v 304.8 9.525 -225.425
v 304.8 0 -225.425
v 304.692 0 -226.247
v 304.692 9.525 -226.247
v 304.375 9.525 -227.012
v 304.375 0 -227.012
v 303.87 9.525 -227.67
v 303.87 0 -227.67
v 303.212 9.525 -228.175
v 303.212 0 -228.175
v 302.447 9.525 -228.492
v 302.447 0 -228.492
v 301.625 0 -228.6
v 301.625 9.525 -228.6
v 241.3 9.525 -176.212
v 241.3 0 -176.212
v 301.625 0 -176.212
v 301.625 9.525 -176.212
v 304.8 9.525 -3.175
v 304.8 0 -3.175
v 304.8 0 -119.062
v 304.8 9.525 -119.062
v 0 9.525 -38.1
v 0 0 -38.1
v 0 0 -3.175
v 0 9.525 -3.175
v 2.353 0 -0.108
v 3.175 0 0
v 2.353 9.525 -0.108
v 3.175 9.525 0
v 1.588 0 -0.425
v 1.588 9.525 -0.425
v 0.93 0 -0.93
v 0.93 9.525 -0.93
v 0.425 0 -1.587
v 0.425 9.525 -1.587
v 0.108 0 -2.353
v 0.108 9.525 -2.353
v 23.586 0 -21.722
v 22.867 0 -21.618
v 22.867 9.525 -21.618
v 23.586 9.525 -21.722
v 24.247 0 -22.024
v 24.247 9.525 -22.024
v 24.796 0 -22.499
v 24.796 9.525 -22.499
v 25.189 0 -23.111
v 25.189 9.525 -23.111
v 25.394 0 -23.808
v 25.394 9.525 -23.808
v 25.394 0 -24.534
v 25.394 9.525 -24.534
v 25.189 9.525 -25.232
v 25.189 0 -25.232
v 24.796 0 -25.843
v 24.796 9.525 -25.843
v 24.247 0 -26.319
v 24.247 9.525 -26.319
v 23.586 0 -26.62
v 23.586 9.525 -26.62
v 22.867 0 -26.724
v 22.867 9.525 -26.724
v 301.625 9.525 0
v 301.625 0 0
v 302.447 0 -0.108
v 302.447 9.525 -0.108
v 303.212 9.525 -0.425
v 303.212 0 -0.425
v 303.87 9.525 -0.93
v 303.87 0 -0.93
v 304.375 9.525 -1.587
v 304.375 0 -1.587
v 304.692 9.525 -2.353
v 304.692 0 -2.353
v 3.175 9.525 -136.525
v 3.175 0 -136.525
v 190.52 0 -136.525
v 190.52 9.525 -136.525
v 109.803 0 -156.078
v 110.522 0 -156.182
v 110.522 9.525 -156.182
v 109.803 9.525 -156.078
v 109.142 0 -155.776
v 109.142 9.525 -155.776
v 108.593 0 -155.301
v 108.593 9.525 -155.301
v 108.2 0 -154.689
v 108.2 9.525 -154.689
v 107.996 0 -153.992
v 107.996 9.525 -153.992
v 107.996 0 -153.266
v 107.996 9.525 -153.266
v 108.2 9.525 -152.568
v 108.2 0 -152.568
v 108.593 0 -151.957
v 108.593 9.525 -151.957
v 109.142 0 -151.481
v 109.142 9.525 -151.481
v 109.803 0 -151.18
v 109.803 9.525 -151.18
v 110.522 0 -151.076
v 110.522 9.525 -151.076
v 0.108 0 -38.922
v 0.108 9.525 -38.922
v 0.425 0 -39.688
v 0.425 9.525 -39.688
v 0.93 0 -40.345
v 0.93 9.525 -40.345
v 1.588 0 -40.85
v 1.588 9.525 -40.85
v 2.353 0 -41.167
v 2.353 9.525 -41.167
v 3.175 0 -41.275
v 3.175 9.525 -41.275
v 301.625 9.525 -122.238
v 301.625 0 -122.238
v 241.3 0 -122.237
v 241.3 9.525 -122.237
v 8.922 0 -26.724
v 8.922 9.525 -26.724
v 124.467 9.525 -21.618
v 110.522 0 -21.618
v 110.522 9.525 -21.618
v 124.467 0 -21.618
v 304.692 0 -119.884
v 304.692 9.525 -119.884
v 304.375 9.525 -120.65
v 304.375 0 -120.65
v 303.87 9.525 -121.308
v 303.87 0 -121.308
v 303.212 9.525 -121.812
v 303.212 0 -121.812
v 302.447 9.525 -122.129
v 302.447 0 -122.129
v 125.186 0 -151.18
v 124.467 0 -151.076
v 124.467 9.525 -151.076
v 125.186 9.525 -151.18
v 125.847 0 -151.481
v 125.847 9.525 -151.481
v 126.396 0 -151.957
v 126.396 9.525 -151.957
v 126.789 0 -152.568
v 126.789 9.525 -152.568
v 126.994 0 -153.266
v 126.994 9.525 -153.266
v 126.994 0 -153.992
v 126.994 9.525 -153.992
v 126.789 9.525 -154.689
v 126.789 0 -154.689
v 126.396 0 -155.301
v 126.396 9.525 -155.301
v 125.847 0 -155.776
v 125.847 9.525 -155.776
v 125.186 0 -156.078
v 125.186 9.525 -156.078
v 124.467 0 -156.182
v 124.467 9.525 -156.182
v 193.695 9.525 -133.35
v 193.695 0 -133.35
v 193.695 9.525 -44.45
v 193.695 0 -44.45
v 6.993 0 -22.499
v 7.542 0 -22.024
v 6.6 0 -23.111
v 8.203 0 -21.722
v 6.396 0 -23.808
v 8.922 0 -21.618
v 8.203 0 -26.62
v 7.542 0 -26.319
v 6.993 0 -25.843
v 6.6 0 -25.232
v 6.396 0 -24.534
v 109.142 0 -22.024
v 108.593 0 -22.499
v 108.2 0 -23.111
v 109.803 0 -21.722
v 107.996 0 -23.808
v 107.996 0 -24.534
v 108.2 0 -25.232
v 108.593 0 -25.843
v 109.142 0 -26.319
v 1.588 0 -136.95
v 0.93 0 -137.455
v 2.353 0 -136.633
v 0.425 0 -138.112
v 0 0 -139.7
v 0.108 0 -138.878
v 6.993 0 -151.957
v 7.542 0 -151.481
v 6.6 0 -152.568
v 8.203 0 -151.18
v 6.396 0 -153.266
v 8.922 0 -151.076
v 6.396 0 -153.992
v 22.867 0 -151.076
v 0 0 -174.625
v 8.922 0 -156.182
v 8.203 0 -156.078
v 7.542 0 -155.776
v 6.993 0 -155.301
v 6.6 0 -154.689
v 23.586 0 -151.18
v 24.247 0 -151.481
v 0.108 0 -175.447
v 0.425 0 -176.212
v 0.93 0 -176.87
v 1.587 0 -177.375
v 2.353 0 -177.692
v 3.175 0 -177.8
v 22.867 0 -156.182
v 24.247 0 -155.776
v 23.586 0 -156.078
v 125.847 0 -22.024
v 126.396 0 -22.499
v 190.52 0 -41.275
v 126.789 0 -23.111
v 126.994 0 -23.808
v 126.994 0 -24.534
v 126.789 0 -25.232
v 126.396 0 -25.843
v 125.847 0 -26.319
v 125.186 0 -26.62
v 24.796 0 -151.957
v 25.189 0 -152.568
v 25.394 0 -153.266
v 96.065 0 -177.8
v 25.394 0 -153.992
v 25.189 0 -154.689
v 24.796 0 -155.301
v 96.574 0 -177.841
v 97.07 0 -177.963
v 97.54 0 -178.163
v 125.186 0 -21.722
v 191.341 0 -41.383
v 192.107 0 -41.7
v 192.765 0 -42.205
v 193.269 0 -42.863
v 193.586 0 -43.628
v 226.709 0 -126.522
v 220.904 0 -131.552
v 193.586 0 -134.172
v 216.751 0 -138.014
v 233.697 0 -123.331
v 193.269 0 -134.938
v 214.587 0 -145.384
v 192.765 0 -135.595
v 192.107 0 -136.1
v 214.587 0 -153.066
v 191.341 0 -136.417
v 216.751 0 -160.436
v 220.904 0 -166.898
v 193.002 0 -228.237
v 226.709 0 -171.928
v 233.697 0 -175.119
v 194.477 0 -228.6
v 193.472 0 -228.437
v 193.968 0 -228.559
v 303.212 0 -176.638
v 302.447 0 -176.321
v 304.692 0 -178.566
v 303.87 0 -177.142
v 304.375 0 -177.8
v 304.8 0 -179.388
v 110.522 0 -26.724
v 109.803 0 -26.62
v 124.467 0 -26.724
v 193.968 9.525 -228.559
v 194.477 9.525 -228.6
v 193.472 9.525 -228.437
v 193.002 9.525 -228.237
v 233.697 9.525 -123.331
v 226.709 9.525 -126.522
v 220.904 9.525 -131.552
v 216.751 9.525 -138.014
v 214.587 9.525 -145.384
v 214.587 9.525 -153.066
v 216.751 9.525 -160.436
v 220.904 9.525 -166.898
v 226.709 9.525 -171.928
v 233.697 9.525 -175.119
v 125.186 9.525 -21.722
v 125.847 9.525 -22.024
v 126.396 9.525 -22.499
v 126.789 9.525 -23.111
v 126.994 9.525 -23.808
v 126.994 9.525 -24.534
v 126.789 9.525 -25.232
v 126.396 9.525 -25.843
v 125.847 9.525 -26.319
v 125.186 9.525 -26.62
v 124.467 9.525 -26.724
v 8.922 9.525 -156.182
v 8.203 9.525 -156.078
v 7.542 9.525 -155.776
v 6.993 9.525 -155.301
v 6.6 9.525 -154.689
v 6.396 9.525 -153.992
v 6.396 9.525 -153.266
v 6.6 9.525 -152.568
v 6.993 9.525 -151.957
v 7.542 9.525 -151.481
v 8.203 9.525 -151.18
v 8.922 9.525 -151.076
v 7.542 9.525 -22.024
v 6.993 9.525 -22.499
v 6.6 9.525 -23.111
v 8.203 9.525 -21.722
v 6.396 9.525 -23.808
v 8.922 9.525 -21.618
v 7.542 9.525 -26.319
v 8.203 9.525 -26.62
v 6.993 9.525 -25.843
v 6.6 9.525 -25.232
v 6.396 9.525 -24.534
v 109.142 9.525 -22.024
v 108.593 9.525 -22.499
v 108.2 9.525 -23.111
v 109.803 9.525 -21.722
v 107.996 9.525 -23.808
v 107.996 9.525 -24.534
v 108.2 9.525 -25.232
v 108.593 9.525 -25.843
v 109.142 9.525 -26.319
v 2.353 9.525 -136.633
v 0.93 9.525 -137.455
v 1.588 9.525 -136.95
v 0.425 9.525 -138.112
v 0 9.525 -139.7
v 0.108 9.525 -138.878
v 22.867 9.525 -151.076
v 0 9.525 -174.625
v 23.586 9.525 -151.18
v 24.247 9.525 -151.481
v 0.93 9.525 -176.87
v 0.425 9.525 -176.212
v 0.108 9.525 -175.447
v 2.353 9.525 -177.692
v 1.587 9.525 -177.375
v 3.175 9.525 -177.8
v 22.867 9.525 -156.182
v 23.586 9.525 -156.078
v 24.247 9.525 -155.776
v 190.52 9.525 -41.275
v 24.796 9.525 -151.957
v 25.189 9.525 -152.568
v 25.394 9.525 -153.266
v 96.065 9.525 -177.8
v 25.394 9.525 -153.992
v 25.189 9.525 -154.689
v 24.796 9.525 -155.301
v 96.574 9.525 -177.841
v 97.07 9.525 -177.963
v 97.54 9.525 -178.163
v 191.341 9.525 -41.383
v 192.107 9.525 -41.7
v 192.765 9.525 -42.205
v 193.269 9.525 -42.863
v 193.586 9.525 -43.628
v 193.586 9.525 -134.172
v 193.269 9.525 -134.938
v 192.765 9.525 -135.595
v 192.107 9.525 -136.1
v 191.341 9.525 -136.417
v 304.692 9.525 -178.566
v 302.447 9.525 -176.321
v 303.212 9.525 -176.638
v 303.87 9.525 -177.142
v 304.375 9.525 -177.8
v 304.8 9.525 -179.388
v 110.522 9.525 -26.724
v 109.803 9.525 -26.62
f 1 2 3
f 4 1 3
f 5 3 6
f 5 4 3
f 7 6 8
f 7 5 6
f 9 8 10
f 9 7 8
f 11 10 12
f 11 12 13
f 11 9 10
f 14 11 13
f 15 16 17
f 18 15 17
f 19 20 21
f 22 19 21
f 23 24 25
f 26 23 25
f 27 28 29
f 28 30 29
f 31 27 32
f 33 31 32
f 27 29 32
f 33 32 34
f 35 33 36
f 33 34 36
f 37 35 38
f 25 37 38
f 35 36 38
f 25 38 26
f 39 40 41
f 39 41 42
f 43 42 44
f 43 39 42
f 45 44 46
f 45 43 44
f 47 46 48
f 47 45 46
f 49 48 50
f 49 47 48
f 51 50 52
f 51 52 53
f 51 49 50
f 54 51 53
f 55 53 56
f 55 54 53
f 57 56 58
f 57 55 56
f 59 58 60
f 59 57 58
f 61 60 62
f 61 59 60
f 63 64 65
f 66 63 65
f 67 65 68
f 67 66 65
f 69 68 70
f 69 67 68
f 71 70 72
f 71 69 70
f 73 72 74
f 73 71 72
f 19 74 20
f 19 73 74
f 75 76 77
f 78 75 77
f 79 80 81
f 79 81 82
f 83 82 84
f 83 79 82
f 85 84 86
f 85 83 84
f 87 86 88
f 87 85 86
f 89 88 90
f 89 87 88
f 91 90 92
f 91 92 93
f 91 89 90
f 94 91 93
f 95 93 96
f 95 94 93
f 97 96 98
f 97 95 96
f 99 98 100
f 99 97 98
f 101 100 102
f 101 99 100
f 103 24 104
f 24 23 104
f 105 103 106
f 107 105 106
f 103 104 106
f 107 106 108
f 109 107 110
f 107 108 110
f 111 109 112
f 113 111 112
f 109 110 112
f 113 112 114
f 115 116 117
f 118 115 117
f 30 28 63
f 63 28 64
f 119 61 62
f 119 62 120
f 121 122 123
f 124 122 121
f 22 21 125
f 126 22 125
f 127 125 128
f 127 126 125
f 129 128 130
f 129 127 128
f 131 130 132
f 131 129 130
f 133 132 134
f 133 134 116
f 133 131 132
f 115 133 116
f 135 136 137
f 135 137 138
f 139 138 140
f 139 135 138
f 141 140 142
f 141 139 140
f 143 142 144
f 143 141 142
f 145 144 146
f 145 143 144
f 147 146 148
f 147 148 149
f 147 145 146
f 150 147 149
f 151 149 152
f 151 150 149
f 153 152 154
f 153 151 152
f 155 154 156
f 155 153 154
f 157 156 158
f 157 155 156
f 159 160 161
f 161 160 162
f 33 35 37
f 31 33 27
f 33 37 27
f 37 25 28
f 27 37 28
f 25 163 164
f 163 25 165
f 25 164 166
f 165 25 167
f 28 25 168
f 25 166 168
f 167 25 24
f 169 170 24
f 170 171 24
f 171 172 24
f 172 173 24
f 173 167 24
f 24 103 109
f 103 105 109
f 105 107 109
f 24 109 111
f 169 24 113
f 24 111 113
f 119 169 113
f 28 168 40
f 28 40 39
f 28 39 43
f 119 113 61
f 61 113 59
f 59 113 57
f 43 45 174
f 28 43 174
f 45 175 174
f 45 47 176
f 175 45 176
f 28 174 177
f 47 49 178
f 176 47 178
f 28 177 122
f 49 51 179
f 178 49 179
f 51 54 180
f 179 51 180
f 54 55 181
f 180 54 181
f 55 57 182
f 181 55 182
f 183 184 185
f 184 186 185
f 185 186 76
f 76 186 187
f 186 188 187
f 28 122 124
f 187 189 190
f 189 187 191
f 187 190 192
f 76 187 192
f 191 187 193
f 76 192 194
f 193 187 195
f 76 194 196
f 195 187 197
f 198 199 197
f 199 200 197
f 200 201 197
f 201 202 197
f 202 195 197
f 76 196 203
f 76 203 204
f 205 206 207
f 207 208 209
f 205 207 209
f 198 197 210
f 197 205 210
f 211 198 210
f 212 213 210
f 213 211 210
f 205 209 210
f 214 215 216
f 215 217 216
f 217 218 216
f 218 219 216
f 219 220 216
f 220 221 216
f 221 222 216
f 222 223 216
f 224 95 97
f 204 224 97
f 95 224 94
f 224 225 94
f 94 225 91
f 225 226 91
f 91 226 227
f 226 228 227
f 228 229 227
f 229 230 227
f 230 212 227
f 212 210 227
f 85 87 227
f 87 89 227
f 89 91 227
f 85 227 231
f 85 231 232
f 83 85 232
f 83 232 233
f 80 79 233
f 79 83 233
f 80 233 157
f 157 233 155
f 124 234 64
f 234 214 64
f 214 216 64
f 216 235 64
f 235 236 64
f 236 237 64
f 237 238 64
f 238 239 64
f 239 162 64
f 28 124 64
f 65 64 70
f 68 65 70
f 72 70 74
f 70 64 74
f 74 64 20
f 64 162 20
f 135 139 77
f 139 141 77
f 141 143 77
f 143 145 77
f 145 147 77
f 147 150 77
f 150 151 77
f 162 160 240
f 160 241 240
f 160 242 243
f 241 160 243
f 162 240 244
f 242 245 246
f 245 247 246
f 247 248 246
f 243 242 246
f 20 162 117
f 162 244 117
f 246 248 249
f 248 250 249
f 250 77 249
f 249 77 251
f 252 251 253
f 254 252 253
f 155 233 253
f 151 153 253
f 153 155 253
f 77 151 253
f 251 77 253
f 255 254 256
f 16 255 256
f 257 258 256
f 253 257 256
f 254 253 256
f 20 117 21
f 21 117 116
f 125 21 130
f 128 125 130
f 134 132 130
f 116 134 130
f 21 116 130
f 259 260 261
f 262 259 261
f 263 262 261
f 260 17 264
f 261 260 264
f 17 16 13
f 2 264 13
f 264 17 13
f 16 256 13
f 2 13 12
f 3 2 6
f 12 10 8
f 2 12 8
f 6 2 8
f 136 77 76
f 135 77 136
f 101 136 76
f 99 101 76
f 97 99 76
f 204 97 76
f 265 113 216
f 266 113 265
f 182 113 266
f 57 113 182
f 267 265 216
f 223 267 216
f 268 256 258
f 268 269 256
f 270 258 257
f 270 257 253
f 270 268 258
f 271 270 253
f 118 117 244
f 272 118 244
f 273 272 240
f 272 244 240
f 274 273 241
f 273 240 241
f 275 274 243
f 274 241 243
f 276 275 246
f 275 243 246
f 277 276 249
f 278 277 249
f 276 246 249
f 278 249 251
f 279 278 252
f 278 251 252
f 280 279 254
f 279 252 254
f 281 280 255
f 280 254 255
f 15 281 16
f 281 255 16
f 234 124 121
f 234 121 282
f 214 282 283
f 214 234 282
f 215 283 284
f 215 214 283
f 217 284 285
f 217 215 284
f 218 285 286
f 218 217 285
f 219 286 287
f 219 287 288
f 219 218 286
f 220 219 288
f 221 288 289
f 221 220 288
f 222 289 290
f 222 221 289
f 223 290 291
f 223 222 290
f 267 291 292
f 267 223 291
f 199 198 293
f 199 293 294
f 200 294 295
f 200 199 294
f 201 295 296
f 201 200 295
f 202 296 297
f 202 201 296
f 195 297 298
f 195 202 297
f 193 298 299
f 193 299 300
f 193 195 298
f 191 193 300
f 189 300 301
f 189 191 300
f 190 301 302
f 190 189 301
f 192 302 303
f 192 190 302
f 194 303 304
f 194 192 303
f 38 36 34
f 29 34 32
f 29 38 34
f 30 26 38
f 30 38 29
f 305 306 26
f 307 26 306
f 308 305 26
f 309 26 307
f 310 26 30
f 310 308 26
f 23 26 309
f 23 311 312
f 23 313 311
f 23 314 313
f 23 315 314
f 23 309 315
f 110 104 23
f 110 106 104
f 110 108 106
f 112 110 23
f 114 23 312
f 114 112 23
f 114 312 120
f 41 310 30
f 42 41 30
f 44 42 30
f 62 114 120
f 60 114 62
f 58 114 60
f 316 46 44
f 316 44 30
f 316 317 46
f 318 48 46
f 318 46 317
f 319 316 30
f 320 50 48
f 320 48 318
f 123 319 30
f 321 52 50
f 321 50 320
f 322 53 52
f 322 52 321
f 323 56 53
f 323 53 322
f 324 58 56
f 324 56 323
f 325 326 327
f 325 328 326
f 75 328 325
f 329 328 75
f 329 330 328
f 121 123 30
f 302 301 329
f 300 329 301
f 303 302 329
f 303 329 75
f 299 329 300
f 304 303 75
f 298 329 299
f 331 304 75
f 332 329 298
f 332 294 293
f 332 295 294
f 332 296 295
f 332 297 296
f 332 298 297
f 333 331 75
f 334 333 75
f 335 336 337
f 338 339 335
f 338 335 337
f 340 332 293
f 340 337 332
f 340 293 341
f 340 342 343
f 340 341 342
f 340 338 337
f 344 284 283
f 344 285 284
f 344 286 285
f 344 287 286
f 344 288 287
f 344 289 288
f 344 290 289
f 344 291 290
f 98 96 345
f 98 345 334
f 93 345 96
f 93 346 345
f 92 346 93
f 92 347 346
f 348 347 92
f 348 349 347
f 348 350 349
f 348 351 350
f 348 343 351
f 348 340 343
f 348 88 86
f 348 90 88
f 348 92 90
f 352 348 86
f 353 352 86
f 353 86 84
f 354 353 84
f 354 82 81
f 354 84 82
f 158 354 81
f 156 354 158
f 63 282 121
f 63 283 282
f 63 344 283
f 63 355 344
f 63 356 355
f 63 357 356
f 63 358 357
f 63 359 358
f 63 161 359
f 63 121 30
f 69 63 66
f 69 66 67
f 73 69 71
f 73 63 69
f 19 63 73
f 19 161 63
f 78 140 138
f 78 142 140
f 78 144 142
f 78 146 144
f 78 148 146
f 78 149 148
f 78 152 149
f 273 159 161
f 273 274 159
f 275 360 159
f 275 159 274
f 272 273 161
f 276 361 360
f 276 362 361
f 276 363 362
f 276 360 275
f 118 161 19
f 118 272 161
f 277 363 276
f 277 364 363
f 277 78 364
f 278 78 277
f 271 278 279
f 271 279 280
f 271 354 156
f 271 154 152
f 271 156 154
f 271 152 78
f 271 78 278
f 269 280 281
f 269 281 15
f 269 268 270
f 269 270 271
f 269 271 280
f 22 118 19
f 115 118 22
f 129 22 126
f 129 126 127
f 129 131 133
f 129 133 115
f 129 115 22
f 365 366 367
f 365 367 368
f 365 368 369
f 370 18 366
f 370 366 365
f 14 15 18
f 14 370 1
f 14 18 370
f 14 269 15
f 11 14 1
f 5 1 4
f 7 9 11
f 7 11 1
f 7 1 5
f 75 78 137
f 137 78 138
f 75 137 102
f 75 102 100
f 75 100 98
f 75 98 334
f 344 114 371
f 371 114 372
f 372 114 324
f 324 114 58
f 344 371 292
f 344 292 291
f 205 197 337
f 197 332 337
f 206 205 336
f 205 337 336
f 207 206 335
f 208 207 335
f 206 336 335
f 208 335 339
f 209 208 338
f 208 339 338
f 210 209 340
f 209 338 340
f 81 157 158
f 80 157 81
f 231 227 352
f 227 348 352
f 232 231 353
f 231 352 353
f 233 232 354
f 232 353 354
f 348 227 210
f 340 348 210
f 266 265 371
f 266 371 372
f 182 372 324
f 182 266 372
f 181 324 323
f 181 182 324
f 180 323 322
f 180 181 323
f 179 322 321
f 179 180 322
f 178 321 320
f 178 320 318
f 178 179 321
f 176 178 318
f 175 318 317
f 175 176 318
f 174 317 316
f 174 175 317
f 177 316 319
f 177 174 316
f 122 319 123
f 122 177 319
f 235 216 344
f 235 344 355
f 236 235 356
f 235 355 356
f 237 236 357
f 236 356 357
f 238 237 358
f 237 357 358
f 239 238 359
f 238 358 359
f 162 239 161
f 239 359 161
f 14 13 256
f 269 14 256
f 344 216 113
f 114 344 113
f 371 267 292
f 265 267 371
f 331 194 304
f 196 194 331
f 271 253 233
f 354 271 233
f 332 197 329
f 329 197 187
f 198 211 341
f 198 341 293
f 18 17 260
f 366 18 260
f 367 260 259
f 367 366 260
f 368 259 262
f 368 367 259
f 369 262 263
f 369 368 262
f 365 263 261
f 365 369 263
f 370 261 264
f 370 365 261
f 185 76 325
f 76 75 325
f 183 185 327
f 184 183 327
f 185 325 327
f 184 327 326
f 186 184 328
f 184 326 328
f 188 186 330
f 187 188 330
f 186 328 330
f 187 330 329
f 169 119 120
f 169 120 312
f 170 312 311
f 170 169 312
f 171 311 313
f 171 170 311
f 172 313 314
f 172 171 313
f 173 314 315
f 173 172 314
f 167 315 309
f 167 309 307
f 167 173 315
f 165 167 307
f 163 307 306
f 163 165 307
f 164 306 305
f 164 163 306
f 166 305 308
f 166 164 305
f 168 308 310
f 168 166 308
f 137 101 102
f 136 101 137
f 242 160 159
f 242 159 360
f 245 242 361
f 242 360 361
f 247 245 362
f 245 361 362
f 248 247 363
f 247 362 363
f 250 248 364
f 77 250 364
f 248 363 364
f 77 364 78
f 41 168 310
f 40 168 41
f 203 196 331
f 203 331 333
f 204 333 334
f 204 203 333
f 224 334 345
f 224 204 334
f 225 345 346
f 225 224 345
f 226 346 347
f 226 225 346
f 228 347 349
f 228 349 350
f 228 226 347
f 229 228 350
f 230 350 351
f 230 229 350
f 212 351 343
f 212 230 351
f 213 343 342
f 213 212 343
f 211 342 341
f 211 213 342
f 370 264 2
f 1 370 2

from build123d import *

# Parameters (mm, degrees)
BOSS_EXTRUDE1_DEPTH            = 9.525
F_7_0_201_DIAMETER_SLOT1_DEPTH = 9.525
FILLET1_R                      = 3.175


# Read off the part's stored shape, not the designer's step: #7 (0.201) Diameter Slot1
with BuildPart() as part:
    # Sketch1 → Boss-Extrude1 (new body)
    with BuildSketch(Plane(origin=(0, 0, 0), x_dir=(1, 0, 0), z_dir=(0, 1, 0))):
        with BuildLine():
            Line((0, 0), (304.8, 0))
            Line((304.8, 0), (304.8, 122.2375))
            Line((304.8, 122.2375), (241.3, 122.2375))
            ThreePointArc((241.3, 122.2375), (214.3125, 149.225), (241.3, 176.2125))
            Line((241.3, 176.2125), (304.8, 176.2125))
            Line((304.8, 176.2125), (304.8, 228.6))
            Line((304.8, 228.6), (193.694523922, 228.6))
            Line((193.694523922, 228.6), (96.847261961, 177.8))
            Line((96.847261961, 177.8), (0, 177.8))
            Line((0, 177.8), (0, 136.525))
            Line((0, 136.525), (193.694523922, 136.525))
            Line((193.694523922, 136.525), (193.694523922, 41.275))
            Line((193.694523922, 41.275), (0, 41.275))
            Line((0, 41.275), (0, 0))
        make_face()
    extrude(amount=BOSS_EXTRUDE1_DEPTH)

    # #7 (0.201) Diameter Slot1 outline → #7 (0.201) Diameter Slot1 (cut)
    with BuildSketch(Plane(origin=(0, 0, 0), x_dir=(1, 0, 0), z_dir=(0, 1, 0))):
        with BuildLine():
            Line((8.922223922, 151.076161), (22.866823922, 151.076161))
            ThreePointArc((22.866823922, 151.076161), (25.419523922, 153.628861), (22.866823922, 156.181561))
            Line((22.866823922, 156.181561), (8.922223922, 156.181561))
            ThreePointArc((8.922223922, 156.181561), (6.369523922, 153.628861), (8.922223922, 151.076161))
        make_face()
        with BuildLine():
            ThreePointArc((124.466823922, 151.076161), (127.019523922, 153.628861), (124.466823922, 156.181561))
            Line((124.466823922, 156.181561), (110.522223922, 156.181561))
            ThreePointArc((110.522223922, 156.181561), (107.969523922, 153.628861), (110.522223922, 151.076161))
            Line((110.522223922, 151.076161), (124.466823922, 151.076161))
        make_face()
        with BuildLine():
            Line((8.922223922, 21.618439), (22.866823922, 21.618439))
            ThreePointArc((22.866823922, 21.618439), (25.419523922, 24.171139), (22.866823922, 26.723839))
            Line((22.866823922, 26.723839), (8.922223922, 26.723839))
            ThreePointArc((8.922223922, 26.723839), (6.369523922, 24.171139), (8.922223922, 21.618439))
        make_face()
        with BuildLine():
            ThreePointArc((124.466823922, 21.618439), (127.019523922, 24.171139), (124.466823922, 26.723839))
            Line((124.466823922, 26.723839), (110.522223922, 26.723839))
            ThreePointArc((110.522223922, 26.723839), (107.969523922, 24.171139), (110.522223922, 21.618439))
            Line((110.522223922, 21.618439), (124.466823922, 21.618439))
        make_face()
    extrude(amount=F_7_0_201_DIAMETER_SLOT1_DEPTH, mode=Mode.SUBTRACT)

    # Fillet1
    fillet1_edges = [part.edges().sort_by_distance(p)[0] for p in [
        (0, 4.7625, -41.275),
        (193.694523922, 4.7625, -41.275),
        (193.694523922, 4.7625, -136.525),
        (0, 4.7625, -136.525),
        (0, 4.7625, -177.8),
        (96.847261961, 4.7625, -177.8),
        (193.694523922, 4.7625, -228.6),
        (304.8, 4.7625, -228.6),
        (304.8, 4.7625, -176.2125),
        (304.8, 4.7625, -122.2375),
        (304.8, 4.7625, 0),
        (0, 4.7625, 0),
    ]]
    fillet(fillet1_edges, radius=FILLET1_R)


solid = part.part
